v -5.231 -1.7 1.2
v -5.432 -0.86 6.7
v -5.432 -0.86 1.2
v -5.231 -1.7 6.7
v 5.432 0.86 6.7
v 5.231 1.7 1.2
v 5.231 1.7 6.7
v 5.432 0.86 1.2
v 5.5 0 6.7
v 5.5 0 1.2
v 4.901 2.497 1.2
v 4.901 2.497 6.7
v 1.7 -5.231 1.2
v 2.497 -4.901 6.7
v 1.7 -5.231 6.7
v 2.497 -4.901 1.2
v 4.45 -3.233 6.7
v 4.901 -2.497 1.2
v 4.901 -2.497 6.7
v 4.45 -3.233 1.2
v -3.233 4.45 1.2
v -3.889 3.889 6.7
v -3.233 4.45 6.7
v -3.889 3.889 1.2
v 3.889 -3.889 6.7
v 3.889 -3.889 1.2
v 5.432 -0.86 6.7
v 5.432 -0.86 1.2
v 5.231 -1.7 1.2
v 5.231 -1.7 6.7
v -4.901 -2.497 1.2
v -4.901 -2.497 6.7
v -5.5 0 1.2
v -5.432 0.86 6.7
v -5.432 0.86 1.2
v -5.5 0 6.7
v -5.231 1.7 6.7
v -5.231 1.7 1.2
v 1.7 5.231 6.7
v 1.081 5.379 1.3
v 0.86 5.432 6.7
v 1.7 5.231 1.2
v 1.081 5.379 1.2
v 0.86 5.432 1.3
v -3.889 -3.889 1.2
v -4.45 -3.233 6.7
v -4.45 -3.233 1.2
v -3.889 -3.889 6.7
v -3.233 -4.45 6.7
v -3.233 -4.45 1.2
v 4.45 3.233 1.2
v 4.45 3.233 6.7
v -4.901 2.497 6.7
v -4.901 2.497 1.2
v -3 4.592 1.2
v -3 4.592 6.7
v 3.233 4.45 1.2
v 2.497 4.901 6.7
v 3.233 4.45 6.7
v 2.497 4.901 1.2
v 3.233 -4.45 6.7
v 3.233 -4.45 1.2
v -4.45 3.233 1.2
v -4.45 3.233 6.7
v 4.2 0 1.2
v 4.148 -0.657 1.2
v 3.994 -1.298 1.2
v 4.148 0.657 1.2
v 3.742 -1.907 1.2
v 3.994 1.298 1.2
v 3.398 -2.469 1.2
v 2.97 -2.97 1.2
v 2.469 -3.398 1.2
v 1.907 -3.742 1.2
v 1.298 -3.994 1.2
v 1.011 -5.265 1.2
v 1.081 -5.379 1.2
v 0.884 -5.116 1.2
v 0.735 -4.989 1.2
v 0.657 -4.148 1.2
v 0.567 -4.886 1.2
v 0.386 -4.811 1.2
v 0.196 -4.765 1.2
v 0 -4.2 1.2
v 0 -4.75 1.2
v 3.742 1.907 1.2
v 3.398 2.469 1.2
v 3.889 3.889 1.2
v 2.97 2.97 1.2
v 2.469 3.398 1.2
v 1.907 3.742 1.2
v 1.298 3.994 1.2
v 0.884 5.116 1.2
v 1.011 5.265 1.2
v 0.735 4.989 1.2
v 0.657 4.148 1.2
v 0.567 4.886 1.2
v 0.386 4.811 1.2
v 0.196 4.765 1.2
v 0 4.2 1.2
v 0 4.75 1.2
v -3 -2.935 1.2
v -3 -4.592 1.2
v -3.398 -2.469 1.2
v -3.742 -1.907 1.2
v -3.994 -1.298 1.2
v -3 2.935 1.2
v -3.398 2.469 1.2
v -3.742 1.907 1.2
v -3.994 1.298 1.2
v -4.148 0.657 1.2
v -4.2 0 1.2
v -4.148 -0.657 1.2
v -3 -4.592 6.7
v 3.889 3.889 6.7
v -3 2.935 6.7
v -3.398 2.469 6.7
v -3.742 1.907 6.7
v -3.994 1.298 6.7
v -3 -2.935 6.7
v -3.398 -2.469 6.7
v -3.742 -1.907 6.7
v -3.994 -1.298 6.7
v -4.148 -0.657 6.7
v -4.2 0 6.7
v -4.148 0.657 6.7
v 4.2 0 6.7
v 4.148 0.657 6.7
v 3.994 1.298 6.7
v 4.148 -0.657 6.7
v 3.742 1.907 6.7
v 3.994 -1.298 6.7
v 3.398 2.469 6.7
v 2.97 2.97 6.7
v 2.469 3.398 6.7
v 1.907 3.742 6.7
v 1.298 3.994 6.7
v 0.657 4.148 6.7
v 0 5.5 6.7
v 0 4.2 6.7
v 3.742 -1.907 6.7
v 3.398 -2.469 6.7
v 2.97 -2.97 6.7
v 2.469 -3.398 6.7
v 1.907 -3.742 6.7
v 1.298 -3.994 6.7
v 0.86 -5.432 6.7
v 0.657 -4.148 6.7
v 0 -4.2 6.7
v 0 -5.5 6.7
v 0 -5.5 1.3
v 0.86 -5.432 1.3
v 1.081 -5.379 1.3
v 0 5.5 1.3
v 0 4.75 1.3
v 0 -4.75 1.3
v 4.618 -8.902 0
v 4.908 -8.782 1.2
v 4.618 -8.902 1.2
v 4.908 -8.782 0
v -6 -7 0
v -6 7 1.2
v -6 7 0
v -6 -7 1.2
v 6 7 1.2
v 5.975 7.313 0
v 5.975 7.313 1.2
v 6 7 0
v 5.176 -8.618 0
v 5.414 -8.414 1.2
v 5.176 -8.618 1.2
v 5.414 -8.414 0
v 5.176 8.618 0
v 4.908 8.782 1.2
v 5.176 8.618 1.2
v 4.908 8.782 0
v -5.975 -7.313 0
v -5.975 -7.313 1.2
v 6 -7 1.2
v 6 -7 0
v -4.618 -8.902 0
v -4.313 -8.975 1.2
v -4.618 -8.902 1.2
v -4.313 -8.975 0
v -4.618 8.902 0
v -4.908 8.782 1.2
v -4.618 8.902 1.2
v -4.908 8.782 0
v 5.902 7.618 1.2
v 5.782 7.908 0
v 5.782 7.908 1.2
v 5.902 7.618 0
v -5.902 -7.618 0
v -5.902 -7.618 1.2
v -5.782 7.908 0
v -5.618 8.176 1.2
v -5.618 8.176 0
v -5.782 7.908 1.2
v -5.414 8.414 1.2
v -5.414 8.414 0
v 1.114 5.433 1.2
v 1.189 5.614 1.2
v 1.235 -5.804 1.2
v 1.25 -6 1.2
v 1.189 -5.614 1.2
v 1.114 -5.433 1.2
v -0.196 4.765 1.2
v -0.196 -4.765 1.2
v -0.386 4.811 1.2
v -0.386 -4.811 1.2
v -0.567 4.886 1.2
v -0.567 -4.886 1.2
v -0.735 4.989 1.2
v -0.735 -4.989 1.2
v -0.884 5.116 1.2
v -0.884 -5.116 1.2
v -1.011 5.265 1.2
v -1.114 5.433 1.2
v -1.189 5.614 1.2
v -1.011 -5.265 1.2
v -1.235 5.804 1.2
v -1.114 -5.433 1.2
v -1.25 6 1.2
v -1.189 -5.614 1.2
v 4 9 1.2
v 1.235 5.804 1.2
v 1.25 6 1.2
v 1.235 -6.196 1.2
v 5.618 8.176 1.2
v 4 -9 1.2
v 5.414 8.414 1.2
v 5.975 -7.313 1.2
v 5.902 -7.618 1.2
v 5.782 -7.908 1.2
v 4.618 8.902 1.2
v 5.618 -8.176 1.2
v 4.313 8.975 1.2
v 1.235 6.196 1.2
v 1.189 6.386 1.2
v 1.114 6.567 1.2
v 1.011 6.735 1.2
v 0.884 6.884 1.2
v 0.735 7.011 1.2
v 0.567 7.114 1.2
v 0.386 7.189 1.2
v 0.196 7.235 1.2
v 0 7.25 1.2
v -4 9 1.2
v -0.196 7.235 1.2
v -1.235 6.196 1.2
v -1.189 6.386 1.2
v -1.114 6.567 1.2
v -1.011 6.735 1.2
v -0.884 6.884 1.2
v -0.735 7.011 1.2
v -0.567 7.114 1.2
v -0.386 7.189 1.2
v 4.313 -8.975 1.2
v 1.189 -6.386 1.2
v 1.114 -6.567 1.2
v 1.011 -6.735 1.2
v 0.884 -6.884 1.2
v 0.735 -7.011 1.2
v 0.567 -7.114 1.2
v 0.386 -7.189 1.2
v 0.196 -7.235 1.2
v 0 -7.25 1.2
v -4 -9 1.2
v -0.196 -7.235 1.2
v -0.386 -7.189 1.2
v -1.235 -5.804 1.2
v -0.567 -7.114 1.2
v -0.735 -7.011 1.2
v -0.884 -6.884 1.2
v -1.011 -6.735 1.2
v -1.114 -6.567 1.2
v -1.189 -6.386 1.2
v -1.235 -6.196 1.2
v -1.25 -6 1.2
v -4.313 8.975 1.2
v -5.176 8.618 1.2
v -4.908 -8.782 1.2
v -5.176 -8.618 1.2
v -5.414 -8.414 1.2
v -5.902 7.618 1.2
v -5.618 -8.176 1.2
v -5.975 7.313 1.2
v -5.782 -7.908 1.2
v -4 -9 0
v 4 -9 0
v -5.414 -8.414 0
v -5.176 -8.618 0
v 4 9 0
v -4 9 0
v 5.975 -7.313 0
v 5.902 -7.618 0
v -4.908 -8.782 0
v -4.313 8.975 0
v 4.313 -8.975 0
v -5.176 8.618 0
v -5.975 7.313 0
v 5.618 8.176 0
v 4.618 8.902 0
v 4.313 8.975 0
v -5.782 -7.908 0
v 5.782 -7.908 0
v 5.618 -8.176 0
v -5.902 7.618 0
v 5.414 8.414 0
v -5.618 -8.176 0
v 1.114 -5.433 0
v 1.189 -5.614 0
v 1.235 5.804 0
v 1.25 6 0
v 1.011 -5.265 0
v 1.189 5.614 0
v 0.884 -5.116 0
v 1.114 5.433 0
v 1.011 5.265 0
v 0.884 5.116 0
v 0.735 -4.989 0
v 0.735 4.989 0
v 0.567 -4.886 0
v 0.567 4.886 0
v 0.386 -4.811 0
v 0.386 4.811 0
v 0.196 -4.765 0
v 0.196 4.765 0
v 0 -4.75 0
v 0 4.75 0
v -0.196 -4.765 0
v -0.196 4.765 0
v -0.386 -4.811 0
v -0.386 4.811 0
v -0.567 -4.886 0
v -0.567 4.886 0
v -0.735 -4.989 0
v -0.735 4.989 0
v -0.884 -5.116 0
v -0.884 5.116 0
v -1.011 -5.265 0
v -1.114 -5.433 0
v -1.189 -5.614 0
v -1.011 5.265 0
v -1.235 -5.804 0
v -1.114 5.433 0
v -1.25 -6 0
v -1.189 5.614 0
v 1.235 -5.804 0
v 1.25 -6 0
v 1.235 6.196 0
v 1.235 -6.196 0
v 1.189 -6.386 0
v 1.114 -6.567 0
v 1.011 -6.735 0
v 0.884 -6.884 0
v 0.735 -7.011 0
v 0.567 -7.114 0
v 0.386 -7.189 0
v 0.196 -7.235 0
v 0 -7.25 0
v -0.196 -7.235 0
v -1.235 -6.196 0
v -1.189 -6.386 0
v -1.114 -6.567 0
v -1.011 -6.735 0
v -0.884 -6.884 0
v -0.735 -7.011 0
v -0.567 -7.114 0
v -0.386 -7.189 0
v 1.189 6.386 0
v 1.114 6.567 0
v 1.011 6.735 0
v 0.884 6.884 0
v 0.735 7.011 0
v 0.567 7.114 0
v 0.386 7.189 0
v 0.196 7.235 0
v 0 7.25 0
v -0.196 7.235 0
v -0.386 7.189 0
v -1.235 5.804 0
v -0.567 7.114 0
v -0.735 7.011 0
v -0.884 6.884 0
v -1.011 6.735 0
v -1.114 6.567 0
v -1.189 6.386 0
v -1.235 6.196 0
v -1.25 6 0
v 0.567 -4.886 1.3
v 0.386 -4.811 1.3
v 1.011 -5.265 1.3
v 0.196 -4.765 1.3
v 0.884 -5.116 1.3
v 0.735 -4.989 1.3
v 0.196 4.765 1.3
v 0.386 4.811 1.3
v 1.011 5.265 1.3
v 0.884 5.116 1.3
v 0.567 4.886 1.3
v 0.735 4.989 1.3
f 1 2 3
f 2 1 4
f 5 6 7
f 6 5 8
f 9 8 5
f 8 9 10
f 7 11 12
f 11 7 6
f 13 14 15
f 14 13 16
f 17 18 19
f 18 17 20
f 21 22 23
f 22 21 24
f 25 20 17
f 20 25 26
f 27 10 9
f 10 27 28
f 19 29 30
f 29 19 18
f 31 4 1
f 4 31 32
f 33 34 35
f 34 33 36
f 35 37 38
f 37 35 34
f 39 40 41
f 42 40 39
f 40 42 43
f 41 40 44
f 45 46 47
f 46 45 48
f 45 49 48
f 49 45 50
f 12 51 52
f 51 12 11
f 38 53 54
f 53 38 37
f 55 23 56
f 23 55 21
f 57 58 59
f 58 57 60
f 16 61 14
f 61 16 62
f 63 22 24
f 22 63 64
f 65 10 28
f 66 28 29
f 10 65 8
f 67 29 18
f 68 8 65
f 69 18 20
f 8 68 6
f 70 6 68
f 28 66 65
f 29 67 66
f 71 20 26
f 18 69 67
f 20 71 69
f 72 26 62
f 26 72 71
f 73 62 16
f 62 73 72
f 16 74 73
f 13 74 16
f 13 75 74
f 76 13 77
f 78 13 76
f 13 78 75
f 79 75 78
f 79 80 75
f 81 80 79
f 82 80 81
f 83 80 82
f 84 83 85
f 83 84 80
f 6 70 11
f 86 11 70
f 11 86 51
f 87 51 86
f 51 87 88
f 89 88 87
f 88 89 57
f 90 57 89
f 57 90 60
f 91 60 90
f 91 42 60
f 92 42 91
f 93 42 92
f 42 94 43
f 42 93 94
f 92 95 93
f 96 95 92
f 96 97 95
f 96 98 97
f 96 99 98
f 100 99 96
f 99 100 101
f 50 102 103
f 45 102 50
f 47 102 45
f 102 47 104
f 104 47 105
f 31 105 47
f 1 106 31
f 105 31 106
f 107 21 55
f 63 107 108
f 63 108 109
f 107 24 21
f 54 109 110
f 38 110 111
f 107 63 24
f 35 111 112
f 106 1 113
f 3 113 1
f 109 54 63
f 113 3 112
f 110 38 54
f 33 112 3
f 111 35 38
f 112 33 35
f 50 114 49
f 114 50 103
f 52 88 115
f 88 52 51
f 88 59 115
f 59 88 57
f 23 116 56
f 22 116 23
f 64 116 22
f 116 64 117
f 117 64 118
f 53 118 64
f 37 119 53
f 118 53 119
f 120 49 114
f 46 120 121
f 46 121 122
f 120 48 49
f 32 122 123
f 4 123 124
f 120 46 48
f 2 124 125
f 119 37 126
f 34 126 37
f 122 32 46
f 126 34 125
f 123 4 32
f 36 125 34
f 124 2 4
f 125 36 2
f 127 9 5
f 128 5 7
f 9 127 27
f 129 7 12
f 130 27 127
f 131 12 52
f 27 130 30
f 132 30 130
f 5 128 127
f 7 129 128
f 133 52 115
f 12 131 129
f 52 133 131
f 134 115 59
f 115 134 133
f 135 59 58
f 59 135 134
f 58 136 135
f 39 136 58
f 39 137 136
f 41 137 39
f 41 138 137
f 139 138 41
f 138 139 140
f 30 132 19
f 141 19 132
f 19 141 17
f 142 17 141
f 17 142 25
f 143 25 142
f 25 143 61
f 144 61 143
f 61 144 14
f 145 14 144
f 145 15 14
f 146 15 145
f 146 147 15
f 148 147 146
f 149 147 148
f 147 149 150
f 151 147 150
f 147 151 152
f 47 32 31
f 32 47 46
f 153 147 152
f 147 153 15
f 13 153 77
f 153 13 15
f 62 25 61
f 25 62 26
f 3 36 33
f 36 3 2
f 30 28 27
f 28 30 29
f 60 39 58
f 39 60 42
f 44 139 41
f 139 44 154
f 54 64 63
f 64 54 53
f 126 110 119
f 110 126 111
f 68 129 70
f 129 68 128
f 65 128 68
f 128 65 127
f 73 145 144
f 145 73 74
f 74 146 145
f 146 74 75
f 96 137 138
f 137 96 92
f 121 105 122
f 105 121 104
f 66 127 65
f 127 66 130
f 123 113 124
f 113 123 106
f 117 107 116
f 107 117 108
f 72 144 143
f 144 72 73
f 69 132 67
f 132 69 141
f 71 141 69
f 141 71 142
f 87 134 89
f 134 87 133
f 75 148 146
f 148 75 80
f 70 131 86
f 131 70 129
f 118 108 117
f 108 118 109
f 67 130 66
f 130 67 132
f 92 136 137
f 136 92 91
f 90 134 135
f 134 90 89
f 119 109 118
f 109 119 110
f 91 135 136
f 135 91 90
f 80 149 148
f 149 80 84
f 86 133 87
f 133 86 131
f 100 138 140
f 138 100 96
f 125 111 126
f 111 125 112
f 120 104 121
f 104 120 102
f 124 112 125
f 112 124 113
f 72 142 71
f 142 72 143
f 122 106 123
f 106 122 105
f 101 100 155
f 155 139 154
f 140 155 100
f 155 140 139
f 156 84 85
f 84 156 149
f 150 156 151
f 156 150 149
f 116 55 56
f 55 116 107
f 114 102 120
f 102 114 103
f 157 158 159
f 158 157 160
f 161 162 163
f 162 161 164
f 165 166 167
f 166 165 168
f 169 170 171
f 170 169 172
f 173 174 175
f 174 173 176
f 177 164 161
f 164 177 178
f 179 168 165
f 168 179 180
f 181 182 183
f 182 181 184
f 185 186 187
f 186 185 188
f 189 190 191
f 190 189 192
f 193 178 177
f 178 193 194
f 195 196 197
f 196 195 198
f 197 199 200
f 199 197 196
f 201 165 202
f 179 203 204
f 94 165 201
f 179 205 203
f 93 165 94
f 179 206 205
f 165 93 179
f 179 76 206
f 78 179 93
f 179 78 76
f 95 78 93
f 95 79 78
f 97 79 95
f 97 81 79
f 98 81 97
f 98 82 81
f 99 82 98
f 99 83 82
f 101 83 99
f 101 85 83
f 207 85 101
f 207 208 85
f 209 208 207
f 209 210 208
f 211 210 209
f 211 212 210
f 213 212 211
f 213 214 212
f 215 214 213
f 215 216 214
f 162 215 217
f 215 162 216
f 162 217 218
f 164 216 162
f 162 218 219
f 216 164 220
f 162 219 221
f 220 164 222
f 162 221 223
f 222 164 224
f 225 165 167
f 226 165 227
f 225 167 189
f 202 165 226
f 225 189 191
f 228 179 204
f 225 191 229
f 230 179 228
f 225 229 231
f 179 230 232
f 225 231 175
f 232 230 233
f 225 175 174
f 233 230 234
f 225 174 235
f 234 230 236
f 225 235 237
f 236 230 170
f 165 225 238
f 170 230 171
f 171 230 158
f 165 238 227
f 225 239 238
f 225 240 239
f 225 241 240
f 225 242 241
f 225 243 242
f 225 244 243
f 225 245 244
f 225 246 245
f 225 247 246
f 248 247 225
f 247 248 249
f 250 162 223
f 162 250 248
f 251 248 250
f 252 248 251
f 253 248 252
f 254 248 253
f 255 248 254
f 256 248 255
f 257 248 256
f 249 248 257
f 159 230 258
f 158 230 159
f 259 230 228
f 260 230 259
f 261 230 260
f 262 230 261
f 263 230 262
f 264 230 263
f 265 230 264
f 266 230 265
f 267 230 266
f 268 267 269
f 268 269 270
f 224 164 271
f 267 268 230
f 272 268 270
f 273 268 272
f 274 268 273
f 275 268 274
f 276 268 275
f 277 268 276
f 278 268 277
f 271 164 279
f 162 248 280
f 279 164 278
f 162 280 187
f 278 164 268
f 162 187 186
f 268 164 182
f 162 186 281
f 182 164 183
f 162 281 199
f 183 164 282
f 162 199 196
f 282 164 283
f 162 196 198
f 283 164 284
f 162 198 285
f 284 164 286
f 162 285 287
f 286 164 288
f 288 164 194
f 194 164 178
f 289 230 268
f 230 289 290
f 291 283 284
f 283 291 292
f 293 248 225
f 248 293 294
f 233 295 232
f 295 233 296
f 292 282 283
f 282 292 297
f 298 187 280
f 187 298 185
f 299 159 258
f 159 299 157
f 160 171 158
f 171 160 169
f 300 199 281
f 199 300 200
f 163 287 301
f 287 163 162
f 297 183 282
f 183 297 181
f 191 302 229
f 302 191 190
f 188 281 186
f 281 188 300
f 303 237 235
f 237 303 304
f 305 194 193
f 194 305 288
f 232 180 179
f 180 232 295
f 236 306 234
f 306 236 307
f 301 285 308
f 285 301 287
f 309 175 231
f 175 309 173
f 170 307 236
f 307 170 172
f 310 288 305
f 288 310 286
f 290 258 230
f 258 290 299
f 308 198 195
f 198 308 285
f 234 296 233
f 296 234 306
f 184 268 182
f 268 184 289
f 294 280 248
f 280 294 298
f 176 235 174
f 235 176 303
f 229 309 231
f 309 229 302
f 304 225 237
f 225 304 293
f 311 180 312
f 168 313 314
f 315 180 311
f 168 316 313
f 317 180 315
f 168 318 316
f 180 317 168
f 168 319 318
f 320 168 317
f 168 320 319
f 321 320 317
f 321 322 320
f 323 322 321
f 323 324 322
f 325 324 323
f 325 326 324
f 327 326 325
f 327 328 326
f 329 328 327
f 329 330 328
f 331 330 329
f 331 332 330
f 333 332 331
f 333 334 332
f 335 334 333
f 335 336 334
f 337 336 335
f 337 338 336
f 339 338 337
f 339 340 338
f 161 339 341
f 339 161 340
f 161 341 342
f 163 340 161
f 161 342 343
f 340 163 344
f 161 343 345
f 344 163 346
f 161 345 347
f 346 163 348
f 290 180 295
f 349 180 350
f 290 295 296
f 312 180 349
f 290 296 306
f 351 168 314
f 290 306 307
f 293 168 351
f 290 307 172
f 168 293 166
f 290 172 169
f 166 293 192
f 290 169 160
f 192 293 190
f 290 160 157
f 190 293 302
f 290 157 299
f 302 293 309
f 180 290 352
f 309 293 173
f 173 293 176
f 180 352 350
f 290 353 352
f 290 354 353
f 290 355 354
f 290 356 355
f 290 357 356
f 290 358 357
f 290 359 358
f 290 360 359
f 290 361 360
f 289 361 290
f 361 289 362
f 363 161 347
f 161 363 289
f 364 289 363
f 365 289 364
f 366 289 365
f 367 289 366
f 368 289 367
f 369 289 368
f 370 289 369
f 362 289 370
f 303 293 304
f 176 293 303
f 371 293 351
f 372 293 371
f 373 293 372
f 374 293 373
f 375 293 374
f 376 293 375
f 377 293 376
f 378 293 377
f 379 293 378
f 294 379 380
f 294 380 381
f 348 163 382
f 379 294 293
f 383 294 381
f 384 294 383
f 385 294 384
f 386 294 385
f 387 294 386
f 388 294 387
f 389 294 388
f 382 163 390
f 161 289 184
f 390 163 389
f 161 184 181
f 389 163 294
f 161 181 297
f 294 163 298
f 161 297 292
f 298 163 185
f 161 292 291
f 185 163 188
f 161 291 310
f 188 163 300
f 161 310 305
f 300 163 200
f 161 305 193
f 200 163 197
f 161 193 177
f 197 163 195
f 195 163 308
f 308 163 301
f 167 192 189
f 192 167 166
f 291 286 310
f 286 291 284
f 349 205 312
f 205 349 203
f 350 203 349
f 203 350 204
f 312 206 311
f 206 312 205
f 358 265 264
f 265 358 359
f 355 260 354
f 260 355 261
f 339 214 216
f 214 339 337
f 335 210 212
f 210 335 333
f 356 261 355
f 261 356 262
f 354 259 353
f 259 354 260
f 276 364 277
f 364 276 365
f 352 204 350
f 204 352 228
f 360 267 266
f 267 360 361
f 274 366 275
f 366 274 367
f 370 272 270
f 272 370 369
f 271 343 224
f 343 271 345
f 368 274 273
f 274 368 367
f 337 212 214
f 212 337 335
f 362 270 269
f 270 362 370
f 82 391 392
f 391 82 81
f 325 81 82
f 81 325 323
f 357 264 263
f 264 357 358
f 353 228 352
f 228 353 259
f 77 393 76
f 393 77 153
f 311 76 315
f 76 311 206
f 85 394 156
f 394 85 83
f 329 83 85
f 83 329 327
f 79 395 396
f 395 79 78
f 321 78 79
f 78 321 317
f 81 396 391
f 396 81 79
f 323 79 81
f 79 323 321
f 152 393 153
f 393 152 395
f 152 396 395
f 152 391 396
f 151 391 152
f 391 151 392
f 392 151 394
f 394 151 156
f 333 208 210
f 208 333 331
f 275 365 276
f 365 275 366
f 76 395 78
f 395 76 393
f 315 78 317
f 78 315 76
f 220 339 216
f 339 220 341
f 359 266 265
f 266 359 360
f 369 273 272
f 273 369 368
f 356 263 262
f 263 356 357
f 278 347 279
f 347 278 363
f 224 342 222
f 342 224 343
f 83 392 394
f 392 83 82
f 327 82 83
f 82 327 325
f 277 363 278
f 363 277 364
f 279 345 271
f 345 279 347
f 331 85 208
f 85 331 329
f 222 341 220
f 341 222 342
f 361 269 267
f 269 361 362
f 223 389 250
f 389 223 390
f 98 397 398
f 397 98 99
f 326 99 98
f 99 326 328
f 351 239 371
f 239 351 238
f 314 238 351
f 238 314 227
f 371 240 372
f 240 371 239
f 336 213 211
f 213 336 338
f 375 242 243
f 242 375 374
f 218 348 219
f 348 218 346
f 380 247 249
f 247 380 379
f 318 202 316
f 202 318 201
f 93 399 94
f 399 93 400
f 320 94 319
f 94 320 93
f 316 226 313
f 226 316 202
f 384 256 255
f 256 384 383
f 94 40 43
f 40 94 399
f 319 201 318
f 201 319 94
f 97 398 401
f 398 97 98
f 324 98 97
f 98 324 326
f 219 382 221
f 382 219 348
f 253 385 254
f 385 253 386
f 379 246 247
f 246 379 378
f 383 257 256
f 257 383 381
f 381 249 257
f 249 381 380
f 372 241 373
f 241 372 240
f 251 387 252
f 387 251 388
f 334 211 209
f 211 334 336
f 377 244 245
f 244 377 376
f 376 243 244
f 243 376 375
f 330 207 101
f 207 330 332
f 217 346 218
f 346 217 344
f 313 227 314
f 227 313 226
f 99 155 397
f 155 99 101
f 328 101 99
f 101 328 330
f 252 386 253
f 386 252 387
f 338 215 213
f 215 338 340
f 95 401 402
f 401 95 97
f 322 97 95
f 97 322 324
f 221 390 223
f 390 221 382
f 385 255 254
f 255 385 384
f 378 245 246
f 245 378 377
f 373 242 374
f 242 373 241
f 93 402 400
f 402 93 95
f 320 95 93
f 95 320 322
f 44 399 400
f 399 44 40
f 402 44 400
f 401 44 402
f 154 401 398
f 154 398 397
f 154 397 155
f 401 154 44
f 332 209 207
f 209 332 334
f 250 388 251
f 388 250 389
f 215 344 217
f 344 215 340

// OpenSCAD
// Cable Management Clip
// Routes cable bundle along forearm sleeve
//
// Parameters
cable_bundle_d = 8;     // Estimated bundle diameter for 6 cables (mm)
clip_wall = 1.5;        // Clip wall thickness (mm)
base_w = 18;            // Base width (mm)
base_l = 12;            // Base length (mm)
base_t = 1.2;           // Base thickness (mm)
sew_hole_d = 2.5;       // Sewing hole diameter (mm)
gap = 3;                // Opening gap for snap-in (mm)
$fn = 40;

module cable_clip() {
    difference() {
        union() {
            // Base plate
            hull() {
                for (x = [-base_l/2 + 2, base_l/2 - 2])
                    for (y = [-base_w/2 + 2, base_w/2 - 2])
                        translate([x, y, 0])
                            cylinder(r=2, h=base_t);
            }

            // Cable channel (C-shape)
            translate([0, 0, base_t])
                difference() {
                    cylinder(d=cable_bundle_d + clip_wall * 2, h=cable_bundle_d/2 + clip_wall);

                    // Inner channel
                    translate([0, 0, -0.1])
                        cylinder(d=cable_bundle_d + 0.4, h=cable_bundle_d/2 + clip_wall + 0.2);

                    // Snap-in gap (top)
                    translate([-gap/2, 0, cable_bundle_d/4])
                        cube([gap, cable_bundle_d + clip_wall * 2 + 1, cable_bundle_d], center=true);
                }
        }

        // Sewing holes (2)
        for (y = [-base_w/2 + 3, base_w/2 - 3])
            translate([0, y, -0.1])
                cylinder(d=sew_hole_d, h=base_t + 0.2);
    }
}

cable_clip();
